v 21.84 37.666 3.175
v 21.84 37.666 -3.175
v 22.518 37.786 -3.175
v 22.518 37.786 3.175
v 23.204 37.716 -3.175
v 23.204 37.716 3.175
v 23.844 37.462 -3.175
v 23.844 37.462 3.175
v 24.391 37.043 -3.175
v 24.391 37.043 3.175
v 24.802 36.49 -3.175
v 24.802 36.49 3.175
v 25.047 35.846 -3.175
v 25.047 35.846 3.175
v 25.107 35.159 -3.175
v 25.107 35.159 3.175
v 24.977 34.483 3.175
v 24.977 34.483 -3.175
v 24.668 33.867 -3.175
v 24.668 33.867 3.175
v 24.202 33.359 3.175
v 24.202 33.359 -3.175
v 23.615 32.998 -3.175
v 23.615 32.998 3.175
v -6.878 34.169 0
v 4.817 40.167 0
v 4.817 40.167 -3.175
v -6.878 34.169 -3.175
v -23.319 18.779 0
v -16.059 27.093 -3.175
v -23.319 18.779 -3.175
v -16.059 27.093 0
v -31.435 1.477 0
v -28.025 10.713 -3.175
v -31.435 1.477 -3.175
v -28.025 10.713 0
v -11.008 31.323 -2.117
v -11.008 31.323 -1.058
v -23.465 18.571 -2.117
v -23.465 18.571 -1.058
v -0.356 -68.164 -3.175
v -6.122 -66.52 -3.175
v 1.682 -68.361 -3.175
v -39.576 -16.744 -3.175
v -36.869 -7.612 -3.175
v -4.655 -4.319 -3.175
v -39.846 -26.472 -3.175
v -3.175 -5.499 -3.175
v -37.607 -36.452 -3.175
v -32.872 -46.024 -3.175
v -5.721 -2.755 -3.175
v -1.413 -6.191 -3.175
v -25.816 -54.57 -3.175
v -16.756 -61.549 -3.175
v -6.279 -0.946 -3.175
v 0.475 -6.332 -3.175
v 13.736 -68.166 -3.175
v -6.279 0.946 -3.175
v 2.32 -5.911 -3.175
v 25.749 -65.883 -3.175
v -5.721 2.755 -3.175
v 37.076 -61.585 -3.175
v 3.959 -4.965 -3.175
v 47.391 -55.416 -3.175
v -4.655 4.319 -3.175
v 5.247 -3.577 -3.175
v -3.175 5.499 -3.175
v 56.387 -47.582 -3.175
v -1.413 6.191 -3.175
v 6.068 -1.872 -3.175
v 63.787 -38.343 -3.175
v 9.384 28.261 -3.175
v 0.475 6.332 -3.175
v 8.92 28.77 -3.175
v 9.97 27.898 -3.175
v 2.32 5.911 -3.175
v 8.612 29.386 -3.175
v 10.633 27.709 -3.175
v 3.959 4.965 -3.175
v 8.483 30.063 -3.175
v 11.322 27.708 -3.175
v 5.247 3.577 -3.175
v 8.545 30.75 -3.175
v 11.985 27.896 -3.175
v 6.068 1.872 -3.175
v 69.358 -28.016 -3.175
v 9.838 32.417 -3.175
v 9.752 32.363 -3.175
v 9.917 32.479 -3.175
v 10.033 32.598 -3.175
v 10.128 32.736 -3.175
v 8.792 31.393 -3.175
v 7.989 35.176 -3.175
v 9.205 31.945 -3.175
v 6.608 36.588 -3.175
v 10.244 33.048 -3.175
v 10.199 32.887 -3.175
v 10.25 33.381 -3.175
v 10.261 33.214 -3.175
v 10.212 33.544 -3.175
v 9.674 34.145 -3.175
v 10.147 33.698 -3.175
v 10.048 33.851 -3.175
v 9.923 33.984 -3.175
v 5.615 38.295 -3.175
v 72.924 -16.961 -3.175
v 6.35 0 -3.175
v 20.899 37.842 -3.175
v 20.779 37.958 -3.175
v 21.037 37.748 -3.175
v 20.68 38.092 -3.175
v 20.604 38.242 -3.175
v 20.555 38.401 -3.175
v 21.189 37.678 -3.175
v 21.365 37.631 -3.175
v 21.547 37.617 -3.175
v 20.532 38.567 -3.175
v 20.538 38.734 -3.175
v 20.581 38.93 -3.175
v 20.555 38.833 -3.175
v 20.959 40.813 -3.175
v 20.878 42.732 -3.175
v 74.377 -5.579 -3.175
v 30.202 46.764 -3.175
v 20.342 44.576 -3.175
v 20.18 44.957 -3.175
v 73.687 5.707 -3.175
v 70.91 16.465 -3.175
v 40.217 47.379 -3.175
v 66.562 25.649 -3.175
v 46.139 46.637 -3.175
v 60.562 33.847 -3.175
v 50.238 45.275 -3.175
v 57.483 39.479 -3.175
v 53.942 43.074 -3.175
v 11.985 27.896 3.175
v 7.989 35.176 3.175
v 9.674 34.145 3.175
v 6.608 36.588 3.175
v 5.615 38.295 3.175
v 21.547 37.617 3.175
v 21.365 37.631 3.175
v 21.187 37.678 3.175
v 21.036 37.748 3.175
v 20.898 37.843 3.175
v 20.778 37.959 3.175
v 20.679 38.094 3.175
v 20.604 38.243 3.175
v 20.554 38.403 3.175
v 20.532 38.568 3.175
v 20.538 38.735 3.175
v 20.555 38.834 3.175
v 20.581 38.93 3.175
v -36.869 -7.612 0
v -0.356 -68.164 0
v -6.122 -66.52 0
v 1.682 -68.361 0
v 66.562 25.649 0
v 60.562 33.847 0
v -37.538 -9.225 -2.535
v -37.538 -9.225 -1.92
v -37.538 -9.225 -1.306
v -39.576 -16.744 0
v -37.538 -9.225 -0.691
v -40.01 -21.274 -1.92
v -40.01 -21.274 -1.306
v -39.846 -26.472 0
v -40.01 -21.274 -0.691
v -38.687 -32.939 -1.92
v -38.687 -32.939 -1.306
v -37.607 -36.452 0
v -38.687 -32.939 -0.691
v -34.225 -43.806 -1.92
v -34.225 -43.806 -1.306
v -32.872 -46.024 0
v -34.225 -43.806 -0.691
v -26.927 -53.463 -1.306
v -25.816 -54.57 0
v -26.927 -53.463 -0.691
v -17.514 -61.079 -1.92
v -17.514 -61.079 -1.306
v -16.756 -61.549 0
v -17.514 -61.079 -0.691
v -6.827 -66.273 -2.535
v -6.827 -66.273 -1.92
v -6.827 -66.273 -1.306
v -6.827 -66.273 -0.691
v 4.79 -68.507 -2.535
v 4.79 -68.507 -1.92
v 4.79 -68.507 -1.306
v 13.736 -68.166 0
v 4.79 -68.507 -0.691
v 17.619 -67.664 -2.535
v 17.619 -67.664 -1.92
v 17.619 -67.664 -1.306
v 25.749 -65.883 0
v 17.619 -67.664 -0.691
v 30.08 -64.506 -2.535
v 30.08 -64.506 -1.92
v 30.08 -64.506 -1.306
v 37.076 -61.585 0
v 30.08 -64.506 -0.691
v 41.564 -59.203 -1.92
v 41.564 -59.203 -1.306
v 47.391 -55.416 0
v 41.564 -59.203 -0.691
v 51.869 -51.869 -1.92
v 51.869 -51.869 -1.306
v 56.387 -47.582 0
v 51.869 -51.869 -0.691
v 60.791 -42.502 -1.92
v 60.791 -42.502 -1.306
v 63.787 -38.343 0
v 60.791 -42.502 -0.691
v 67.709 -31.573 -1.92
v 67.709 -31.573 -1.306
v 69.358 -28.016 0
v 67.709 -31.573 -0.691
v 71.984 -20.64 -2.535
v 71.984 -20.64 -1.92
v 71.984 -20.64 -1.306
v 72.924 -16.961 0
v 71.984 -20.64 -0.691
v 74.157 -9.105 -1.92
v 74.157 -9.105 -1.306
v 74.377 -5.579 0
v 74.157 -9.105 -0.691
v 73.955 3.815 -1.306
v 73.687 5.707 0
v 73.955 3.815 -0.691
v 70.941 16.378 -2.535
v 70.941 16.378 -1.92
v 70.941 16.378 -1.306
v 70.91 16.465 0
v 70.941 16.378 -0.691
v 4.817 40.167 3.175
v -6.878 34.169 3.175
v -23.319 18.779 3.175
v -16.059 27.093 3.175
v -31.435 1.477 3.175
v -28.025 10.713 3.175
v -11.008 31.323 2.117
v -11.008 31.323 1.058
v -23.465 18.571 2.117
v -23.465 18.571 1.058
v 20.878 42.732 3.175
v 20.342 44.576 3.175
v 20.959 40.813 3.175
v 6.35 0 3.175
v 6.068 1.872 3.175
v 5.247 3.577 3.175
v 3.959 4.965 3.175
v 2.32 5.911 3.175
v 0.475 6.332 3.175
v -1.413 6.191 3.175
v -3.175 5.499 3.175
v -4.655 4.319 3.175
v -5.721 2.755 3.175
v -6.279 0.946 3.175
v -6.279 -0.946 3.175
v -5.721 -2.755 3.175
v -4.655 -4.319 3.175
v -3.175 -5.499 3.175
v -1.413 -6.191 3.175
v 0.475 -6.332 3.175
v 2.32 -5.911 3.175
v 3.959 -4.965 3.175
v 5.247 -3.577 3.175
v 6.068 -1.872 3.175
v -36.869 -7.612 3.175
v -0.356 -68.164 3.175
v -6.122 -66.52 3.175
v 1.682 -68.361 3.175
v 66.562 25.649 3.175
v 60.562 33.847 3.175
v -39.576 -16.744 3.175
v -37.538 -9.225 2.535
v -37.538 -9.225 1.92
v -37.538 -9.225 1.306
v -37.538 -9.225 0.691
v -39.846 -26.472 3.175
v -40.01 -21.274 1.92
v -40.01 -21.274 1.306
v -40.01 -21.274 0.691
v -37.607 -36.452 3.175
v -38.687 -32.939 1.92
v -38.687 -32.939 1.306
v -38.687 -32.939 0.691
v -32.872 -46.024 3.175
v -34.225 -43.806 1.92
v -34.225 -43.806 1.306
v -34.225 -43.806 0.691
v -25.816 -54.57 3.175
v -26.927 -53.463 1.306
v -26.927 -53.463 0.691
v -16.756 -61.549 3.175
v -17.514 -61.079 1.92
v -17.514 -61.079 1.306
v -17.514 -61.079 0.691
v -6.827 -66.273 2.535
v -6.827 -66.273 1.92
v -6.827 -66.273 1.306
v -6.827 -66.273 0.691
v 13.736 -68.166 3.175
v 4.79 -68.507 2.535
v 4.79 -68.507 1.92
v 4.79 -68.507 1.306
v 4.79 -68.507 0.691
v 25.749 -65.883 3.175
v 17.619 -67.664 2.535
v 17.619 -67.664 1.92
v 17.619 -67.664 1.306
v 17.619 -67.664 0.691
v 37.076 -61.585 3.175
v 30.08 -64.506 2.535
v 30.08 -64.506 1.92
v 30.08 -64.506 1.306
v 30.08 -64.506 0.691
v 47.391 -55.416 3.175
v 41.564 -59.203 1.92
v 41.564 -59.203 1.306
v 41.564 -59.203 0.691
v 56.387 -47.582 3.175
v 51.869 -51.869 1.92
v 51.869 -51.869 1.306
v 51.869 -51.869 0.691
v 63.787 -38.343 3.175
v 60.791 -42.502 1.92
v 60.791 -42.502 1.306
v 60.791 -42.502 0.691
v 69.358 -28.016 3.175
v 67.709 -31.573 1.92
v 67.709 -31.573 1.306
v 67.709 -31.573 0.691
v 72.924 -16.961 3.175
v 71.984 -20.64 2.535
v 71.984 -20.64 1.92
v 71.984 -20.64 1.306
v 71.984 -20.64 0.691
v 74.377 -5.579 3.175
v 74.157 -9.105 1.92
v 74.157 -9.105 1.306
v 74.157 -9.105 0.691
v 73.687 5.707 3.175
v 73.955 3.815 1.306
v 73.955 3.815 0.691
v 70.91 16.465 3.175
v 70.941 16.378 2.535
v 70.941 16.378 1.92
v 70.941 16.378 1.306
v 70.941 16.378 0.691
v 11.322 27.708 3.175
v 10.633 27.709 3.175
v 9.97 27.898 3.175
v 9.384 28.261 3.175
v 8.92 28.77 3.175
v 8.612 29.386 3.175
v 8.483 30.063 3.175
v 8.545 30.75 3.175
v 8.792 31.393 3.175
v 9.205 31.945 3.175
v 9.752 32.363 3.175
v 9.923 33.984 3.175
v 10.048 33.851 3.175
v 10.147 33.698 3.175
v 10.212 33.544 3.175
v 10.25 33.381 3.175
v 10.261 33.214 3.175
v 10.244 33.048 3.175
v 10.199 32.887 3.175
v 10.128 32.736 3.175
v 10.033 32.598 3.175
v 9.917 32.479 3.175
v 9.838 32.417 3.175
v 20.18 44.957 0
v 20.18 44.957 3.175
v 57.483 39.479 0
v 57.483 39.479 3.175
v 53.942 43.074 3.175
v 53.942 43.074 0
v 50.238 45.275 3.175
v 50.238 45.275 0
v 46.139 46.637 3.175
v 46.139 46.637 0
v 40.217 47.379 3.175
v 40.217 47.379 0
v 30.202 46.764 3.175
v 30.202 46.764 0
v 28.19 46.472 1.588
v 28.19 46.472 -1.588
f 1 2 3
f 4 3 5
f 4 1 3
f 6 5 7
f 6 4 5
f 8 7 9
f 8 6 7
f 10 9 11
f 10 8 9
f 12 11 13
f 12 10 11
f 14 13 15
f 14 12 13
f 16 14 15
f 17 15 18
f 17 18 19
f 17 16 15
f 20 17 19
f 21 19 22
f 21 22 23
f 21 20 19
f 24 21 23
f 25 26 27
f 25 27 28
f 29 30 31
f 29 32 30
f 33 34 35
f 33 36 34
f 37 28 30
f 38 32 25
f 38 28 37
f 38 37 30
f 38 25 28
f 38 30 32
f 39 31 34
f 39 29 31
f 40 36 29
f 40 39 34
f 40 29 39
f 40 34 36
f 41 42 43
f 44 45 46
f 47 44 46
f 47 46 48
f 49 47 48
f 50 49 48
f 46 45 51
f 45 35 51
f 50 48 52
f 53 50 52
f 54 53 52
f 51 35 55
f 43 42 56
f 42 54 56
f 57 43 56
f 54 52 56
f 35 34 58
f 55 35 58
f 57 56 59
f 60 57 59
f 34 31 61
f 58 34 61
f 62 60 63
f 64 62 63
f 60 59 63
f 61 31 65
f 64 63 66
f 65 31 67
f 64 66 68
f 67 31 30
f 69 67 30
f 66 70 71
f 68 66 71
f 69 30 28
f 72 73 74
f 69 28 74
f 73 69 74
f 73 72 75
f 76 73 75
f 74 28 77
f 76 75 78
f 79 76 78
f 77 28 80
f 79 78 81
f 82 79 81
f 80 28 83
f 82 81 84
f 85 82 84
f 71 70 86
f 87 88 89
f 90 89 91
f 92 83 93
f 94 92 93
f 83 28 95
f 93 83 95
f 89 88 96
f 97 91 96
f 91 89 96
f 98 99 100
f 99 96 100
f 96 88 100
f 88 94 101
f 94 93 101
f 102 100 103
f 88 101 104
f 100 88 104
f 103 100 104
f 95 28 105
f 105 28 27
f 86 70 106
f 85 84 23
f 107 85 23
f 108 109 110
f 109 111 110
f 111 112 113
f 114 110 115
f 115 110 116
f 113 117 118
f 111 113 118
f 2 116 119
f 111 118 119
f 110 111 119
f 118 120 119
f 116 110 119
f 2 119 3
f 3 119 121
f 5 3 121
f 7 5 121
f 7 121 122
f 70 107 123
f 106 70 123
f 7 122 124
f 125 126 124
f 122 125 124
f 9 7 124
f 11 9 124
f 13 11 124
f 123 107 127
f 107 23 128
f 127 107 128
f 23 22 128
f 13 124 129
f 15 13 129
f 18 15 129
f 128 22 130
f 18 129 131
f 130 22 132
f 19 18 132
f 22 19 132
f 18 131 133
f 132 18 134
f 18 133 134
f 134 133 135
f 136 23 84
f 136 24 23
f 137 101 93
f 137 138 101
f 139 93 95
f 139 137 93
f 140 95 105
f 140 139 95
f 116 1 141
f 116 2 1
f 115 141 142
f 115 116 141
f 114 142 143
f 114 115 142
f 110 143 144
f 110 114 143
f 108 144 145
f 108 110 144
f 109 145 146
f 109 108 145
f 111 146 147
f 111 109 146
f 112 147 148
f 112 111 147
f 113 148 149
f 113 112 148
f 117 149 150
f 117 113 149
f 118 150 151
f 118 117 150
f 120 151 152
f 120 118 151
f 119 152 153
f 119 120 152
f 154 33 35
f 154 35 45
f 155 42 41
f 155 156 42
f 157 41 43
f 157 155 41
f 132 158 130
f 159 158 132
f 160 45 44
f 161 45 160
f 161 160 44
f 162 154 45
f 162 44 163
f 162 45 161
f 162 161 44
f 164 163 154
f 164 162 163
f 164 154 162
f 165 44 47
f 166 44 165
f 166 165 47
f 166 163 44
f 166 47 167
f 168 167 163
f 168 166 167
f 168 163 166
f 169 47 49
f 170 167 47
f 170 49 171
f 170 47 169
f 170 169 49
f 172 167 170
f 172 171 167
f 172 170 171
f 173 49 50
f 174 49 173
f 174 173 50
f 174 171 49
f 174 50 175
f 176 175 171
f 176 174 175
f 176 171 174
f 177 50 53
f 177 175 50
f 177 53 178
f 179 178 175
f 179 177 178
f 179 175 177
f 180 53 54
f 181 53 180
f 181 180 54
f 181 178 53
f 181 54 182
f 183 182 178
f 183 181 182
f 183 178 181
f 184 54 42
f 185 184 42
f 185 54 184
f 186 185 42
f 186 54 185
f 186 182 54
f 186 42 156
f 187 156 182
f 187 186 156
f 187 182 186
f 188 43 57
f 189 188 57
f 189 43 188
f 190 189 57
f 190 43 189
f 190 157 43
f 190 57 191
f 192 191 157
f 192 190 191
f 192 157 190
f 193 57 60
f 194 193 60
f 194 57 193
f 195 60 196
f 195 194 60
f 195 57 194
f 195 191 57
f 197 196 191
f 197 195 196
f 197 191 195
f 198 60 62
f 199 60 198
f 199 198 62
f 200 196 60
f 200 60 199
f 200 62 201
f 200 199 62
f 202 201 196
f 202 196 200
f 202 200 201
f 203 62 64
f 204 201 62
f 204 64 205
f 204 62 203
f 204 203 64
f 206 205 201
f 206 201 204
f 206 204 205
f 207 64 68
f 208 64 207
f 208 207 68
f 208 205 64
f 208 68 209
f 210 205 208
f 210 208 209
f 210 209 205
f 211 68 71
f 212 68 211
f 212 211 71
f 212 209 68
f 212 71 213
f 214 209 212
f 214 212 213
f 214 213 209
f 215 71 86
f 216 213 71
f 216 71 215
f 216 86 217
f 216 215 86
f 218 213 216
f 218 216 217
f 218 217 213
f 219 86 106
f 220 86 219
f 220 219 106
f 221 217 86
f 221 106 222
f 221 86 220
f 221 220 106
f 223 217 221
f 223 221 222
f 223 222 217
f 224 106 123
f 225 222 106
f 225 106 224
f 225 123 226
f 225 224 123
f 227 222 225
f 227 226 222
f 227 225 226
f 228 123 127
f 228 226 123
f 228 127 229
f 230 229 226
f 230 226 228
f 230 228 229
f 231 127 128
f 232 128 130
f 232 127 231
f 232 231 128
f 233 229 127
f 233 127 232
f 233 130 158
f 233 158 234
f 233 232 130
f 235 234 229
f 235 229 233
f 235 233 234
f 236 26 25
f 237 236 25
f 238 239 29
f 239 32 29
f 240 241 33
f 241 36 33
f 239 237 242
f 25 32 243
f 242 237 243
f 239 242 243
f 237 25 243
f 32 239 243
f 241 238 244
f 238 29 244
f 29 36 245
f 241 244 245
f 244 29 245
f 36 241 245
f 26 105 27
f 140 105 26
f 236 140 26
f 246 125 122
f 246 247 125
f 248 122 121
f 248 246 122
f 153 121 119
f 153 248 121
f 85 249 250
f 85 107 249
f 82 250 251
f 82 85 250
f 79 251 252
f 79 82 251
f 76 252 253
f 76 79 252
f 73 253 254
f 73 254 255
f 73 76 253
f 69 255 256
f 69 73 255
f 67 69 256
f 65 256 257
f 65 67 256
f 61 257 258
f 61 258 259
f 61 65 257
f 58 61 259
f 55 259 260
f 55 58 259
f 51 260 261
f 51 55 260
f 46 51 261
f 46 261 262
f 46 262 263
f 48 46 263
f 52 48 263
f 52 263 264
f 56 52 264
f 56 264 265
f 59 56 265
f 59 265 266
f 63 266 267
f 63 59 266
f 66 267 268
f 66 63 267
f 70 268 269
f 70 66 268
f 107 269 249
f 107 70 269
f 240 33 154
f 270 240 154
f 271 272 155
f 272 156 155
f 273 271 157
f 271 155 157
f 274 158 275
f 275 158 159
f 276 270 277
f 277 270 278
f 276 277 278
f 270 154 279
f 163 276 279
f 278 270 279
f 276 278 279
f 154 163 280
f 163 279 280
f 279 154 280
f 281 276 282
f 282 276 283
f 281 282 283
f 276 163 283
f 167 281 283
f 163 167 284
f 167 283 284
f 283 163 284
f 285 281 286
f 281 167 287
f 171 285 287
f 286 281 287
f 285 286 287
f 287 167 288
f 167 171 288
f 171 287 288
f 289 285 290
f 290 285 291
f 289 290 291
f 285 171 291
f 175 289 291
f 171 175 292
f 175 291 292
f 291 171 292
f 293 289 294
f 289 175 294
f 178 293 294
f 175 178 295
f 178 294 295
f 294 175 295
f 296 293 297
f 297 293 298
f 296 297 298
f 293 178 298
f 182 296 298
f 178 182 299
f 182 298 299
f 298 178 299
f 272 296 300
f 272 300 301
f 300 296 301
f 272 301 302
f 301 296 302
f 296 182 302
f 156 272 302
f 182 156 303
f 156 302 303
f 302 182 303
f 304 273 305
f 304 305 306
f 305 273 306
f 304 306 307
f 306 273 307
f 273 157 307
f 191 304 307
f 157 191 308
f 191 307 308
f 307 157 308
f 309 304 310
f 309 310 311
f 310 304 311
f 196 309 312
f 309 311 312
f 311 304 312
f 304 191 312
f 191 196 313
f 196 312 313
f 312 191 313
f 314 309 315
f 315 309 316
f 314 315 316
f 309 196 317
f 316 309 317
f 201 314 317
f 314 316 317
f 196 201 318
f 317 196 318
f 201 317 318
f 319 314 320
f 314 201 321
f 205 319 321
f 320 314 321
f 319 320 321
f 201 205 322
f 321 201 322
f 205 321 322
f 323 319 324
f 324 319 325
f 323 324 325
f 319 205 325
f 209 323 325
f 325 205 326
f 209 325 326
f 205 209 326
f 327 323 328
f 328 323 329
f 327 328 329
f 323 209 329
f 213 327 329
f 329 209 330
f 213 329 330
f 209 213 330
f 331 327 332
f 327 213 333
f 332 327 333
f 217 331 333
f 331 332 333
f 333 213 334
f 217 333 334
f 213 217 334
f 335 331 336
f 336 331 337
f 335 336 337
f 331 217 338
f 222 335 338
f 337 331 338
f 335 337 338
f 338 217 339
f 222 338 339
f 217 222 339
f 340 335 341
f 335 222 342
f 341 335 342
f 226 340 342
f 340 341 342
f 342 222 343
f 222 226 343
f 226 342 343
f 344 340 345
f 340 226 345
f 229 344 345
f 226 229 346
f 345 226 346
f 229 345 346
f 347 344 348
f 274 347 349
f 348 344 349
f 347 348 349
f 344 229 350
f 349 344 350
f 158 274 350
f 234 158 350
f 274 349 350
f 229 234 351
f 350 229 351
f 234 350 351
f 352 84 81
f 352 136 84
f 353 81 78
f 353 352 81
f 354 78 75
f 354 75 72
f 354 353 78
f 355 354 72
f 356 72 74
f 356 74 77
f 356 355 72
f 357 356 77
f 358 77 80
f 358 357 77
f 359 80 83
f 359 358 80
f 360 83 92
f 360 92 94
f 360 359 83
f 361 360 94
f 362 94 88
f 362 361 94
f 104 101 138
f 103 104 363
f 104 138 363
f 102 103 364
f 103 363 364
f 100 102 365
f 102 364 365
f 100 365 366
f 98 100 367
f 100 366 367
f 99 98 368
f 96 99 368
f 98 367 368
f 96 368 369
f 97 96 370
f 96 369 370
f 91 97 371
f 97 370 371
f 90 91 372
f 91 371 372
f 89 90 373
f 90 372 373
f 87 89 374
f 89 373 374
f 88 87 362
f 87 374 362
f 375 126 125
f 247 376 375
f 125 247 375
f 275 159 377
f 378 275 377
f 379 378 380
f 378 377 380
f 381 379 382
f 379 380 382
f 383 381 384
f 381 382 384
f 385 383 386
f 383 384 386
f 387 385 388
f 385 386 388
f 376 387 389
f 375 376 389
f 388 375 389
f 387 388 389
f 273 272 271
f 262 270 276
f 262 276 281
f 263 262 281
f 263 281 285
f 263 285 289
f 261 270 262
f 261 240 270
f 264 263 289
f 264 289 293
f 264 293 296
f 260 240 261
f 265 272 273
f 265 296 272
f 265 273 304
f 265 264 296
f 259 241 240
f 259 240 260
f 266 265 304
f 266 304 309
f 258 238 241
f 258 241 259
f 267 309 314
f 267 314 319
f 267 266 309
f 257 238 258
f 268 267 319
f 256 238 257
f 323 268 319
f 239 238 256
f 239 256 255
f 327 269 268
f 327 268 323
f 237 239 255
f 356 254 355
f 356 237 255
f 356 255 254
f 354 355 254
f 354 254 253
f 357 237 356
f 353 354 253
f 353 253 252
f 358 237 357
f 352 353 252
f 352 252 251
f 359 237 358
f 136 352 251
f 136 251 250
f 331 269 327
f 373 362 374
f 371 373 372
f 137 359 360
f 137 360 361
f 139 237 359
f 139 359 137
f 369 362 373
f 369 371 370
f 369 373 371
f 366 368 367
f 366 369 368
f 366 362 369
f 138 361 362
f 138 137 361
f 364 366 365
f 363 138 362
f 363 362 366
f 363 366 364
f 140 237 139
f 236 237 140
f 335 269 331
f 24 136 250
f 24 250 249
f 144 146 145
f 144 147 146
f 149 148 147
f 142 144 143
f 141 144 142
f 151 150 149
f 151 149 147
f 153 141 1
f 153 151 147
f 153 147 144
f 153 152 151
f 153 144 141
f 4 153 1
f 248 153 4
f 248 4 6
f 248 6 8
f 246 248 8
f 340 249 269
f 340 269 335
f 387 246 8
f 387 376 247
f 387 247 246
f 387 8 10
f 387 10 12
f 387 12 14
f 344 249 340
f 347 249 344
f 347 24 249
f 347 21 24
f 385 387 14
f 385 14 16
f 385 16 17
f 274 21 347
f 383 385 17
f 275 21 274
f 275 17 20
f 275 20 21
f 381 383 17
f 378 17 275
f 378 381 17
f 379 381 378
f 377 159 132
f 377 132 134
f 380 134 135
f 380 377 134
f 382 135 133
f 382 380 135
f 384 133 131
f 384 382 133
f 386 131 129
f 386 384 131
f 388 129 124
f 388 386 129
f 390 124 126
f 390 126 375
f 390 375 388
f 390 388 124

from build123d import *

# Parameters (mm, degrees)
SKETCH1_R           = 6.35
BOSS_EXTRUDE1_DEPTH = 3.175
FILLET3_R           = 1


with BuildPart() as part:
    # Sketch1 → Boss-Extrude1 (new body, symmetric)
    with BuildSketch(Plane.XY):
        with BuildLine():
            ThreePointArc((11.984914181, 27.895733584), (8.691133377, 29.180649151), (9.976048944, 32.474429955))
            Line((9.976048944, 32.474429955), (12.234616787, 33.465357952))
            ThreePointArc((12.234616787, 33.465357952), (8.260068693, 34.969173795), (5.615202157, 38.295309036))
            Line((5.615202157, 38.295309036), (4.817017743, 40.166741189))
            add(Edge.make_bspline(
                [(4.817017743, 40.166741189), (-12.318313017, 33.133186073), (-26.082330189, 20.886296157), (-31.434854064, 1.476615471)],
                knots=[0.525970045, 0.525970045, 0.525970045, 0.525970045, 1, 1, 1, 1], degree=3))
            add(Edge.make_bspline(
                [(-31.434854064, 1.476615471), (-31.527195505, 1.353858054), (-31.754298965, 1.049739376), (-32.114304, 0.558316675), (-32.5147745, -0.002107391), (-32.914270808, -0.576495389), (-33.311891924, -1.165119679), (-33.706725269, -1.768206694), (-34.097848502, -2.385936616), (-34.484331346, -3.018443117), (-34.865237427, -3.665813149), (-35.239626109, -4.328086807), (-35.606554333, -5.005257241), (-35.965078463, -5.697270632), (-36.433186951, -6.644749058), (-36.877778588, -7.616227649), (-37.403538549, -8.865808487), (-37.89844649, -10.15596349), (-38.339644059, -11.47844157), (-38.659981536, -12.561345718), (-38.883742195, -13.388599922), (-39.089211509, -14.227060001), (-39.27554788, -15.076191498), (-39.498552768, -16.225715183), (-39.726946666, -17.686700696), (-39.917996988, -19.468580741), (-40.024782444, -21.280969713), (-40.045341441, -23.119742437), (-39.9779185, -24.980664299), (-39.820968297, -26.859401742), (-39.573161339, -28.751532609), (-39.233388685, -30.652556865), (-38.800766241, -32.557907545), (-38.274638487, -34.462961931), (-37.654581673, -36.363052938), (-36.940406441, -38.253480666), (-36.132159895, -40.129524105), (-35.230127076, -41.986452952), (-34.234831872, -43.819539532), (-33.147037329, -45.624070773), (-31.967745371, -47.395360218), (-30.69819593, -49.128760047), (-29.339865478, -50.819673076), (-27.894464961, -52.463564698), (-26.363937143, -54.055974755), (-24.750453354, -55.592529291), (-23.05640966, -57.068952172), (-21.284422438, -58.481076539), (-19.437323392, -59.824856061), (-17.518153991, -61.09637597), (-15.53015936, -62.291863846), (-13.476781624, -63.407700126), (-11.361652741, -64.440428475), (-9.553831313, -65.227709289), (-8.080597677, -65.813060218), (-6.960835983, -66.230097397), (-5.828609099, -66.623940834), (-4.684517393, -66.994692102), (-3.528855098, -67.340343758), (-2.363108933, -67.666857115), (-1.184337898, -67.950379167), (-0.01402302, -68.276721004), (1.19496178, -68.321277307), (2.388869047, -68.414812178), (3.588916798, -68.47013668), (4.791045471, -68.510536097), (5.995946941, -68.529549806), (7.203027199, -68.528714145), (8.412028292, -68.507423656), (10.433152978, -68.437688056), (12.861297544, -68.271113035), (15.690066279, -67.954769994), (18.114395708, -67.598393542), (20.533178068, -67.156262739), (22.94320403, -66.627739384), (25.34117249, -66.012319379), (27.72369681, -65.309640519), (30.087311662, -64.519489877), (32.428480366, -63.641810853), (34.743602713, -62.676709846), (37.029023257, -61.624462503), (39.281040057, -60.485519541), (41.495913836, -59.26051209), (43.669877536, -57.950256553), (45.799146255, -56.555758944), (47.879927513, -55.078218686), (49.908431845, -53.519031845), (51.880883673, -51.879793783), (53.793532432, -50.162301209), (55.642663916, -48.368553607), (57.424611814, -46.500754037), (59.135769398, -44.561309278), (60.772601325, -42.552829318), (62.331655529, -40.478126172), (63.809575152, -38.340212016), (65.203110484, -36.142296645), (66.509130877, -33.887784231), (67.724636585, -31.580269399), (68.846770509, -29.223532602), (69.872829789, -26.821534809), (70.800277214, -24.378411507), (71.626752419, -21.898466018), (72.350082814, -19.386162143), (72.968294223, -16.846116143), (73.479621181, -14.283088065), (73.882516868, -11.701972429), (74.175662624, -9.107788295), (74.35797703, -6.505668721), (74.428624501, -3.900849636), (74.387023371, -1.298658146), (74.232853422, 1.295499691), (73.966062842, 3.876151621), (73.586874568, 6.437772425), (73.095791985, 8.974797617), (72.493603959, 11.481637571), (71.781389173, 13.952692039), (70.960519734, 16.382365041), (70.032664043, 18.765080076), (68.999788887, 21.095295628), (67.864160745, 23.367520924), (66.628346286, 25.576331908), (65.295212039, 27.716387387), (63.867923223, 29.782445306), (62.349941726, 31.769379124), (61.22405744, 33.104244186), (60.617225546, 33.785688077), (60.561937131, 33.847469547)],
                knots=[0.746012314, 0.746012314, 0.746012314, 0.746012314, 0.747290584, 0.749170776, 0.751081502, 0.753022336, 0.754992805, 0.756992401, 0.759020578, 0.761076761, 0.763160347, 0.76527071, 0.767407202, 0.769569155, 0.771755887, 0.776200882, 0.778457713, 0.783036392, 0.787696808, 0.790055792, 0.792432952, 0.794827532, 0.797238799, 0.799666426, 0.804570687, 0.809540165, 0.814574675, 0.819673984, 0.824837811, 0.830065834, 0.835357687, 0.840712962, 0.84613121, 0.851611942, 0.857154631, 0.862758708, 0.868423573, 0.874148584, 0.879933066, 0.885776307, 0.891677564, 0.897636058, 0.903650977, 0.909721476, 0.915846682, 0.922025687, 0.928257554, 0.934541315, 0.940875975, 0.947260508, 0.95369386, 0.960174949, 0.966702667, 0.973275876, 0.976579178, 0.979893415, 0.983218438, 0.986554095, 0.989900235, 0.993256703, 0.996623344, 1, 1.003319606, 1.00664483, 1.00997572, 1.013312315, 1.016654652, 1.020002764, 1.023356679, 1.026716422, 1.036830797, 1.043603114, 1.050398984, 1.057218364, 1.064061153, 1.070927192, 1.077816264, 1.084728096, 1.09166236, 1.098618675, 1.105596607, 1.112595671, 1.119615332, 1.126655005, 1.133714056, 1.140791804, 1.147887524, 1.155000443, 1.162129745, 1.169274569, 1.176434014, 1.183607137, 1.190792953, 1.197990441, 1.205198539, 1.212416148, 1.219642135, 1.226875331, 1.234114533, 1.241358506, 1.248605983, 1.255855669, 1.263106241, 1.270356345, 1.277604607, 1.284849627, 1.292089983, 1.299324234, 1.306550921, 1.313768569, 1.320975689, 1.328170782, 1.335352341, 1.342518853, 1.349668803, 1.356800674, 1.363912958, 1.37100415, 1.37807276, 1.385117313, 1.392136355, 1.399128458, 1.406092224, 1.413026294, 1.419929348, 1.420619252, 1.420619252, 1.420619252, 1.420619252], degree=3))
            add(Edge.make_bspline(
                [(60.561937131, 33.847469547), (54.845801337, 48.446027811), (38.415683117, 48.488850835), (22.815960401, 45.553267169), (20.179716664, 44.956820308)],
                knots=[0, 0, 0, 0, 0.323798127, 0.390810822, 0.390810822, 0.390810822, 0.390810822], degree=3))
            Line((20.179716664, 44.956820308), (20.341961861, 44.576418389))
            ThreePointArc((20.341961861, 44.576418389), (20.922430294, 40.447066038), (19.347369883, 36.586019659))
            Line((19.347369883, 36.586019659), (21.605937727, 37.576947657))
            ThreePointArc((21.605937727, 37.576947657), (24.899718531, 36.29203209), (23.614802964, 32.998251286))
            Line((23.614802964, 32.998251286), (11.984914181, 27.895733584))
        make_face()
        Circle(SKETCH1_R, mode=Mode.SUBTRACT)
    extrude(amount=BOSS_EXTRUDE1_DEPTH, both=True)

    # Fillet3
    fillet3_edges = [part.edges().sort_by_distance(p)[0] for p in [
        (12.234616787, 33.465357952, 0),
        (19.347369883, 36.586019659, 0),
    ]]
    fillet(fillet3_edges, radius=FILLET3_R)


solid = part.part
